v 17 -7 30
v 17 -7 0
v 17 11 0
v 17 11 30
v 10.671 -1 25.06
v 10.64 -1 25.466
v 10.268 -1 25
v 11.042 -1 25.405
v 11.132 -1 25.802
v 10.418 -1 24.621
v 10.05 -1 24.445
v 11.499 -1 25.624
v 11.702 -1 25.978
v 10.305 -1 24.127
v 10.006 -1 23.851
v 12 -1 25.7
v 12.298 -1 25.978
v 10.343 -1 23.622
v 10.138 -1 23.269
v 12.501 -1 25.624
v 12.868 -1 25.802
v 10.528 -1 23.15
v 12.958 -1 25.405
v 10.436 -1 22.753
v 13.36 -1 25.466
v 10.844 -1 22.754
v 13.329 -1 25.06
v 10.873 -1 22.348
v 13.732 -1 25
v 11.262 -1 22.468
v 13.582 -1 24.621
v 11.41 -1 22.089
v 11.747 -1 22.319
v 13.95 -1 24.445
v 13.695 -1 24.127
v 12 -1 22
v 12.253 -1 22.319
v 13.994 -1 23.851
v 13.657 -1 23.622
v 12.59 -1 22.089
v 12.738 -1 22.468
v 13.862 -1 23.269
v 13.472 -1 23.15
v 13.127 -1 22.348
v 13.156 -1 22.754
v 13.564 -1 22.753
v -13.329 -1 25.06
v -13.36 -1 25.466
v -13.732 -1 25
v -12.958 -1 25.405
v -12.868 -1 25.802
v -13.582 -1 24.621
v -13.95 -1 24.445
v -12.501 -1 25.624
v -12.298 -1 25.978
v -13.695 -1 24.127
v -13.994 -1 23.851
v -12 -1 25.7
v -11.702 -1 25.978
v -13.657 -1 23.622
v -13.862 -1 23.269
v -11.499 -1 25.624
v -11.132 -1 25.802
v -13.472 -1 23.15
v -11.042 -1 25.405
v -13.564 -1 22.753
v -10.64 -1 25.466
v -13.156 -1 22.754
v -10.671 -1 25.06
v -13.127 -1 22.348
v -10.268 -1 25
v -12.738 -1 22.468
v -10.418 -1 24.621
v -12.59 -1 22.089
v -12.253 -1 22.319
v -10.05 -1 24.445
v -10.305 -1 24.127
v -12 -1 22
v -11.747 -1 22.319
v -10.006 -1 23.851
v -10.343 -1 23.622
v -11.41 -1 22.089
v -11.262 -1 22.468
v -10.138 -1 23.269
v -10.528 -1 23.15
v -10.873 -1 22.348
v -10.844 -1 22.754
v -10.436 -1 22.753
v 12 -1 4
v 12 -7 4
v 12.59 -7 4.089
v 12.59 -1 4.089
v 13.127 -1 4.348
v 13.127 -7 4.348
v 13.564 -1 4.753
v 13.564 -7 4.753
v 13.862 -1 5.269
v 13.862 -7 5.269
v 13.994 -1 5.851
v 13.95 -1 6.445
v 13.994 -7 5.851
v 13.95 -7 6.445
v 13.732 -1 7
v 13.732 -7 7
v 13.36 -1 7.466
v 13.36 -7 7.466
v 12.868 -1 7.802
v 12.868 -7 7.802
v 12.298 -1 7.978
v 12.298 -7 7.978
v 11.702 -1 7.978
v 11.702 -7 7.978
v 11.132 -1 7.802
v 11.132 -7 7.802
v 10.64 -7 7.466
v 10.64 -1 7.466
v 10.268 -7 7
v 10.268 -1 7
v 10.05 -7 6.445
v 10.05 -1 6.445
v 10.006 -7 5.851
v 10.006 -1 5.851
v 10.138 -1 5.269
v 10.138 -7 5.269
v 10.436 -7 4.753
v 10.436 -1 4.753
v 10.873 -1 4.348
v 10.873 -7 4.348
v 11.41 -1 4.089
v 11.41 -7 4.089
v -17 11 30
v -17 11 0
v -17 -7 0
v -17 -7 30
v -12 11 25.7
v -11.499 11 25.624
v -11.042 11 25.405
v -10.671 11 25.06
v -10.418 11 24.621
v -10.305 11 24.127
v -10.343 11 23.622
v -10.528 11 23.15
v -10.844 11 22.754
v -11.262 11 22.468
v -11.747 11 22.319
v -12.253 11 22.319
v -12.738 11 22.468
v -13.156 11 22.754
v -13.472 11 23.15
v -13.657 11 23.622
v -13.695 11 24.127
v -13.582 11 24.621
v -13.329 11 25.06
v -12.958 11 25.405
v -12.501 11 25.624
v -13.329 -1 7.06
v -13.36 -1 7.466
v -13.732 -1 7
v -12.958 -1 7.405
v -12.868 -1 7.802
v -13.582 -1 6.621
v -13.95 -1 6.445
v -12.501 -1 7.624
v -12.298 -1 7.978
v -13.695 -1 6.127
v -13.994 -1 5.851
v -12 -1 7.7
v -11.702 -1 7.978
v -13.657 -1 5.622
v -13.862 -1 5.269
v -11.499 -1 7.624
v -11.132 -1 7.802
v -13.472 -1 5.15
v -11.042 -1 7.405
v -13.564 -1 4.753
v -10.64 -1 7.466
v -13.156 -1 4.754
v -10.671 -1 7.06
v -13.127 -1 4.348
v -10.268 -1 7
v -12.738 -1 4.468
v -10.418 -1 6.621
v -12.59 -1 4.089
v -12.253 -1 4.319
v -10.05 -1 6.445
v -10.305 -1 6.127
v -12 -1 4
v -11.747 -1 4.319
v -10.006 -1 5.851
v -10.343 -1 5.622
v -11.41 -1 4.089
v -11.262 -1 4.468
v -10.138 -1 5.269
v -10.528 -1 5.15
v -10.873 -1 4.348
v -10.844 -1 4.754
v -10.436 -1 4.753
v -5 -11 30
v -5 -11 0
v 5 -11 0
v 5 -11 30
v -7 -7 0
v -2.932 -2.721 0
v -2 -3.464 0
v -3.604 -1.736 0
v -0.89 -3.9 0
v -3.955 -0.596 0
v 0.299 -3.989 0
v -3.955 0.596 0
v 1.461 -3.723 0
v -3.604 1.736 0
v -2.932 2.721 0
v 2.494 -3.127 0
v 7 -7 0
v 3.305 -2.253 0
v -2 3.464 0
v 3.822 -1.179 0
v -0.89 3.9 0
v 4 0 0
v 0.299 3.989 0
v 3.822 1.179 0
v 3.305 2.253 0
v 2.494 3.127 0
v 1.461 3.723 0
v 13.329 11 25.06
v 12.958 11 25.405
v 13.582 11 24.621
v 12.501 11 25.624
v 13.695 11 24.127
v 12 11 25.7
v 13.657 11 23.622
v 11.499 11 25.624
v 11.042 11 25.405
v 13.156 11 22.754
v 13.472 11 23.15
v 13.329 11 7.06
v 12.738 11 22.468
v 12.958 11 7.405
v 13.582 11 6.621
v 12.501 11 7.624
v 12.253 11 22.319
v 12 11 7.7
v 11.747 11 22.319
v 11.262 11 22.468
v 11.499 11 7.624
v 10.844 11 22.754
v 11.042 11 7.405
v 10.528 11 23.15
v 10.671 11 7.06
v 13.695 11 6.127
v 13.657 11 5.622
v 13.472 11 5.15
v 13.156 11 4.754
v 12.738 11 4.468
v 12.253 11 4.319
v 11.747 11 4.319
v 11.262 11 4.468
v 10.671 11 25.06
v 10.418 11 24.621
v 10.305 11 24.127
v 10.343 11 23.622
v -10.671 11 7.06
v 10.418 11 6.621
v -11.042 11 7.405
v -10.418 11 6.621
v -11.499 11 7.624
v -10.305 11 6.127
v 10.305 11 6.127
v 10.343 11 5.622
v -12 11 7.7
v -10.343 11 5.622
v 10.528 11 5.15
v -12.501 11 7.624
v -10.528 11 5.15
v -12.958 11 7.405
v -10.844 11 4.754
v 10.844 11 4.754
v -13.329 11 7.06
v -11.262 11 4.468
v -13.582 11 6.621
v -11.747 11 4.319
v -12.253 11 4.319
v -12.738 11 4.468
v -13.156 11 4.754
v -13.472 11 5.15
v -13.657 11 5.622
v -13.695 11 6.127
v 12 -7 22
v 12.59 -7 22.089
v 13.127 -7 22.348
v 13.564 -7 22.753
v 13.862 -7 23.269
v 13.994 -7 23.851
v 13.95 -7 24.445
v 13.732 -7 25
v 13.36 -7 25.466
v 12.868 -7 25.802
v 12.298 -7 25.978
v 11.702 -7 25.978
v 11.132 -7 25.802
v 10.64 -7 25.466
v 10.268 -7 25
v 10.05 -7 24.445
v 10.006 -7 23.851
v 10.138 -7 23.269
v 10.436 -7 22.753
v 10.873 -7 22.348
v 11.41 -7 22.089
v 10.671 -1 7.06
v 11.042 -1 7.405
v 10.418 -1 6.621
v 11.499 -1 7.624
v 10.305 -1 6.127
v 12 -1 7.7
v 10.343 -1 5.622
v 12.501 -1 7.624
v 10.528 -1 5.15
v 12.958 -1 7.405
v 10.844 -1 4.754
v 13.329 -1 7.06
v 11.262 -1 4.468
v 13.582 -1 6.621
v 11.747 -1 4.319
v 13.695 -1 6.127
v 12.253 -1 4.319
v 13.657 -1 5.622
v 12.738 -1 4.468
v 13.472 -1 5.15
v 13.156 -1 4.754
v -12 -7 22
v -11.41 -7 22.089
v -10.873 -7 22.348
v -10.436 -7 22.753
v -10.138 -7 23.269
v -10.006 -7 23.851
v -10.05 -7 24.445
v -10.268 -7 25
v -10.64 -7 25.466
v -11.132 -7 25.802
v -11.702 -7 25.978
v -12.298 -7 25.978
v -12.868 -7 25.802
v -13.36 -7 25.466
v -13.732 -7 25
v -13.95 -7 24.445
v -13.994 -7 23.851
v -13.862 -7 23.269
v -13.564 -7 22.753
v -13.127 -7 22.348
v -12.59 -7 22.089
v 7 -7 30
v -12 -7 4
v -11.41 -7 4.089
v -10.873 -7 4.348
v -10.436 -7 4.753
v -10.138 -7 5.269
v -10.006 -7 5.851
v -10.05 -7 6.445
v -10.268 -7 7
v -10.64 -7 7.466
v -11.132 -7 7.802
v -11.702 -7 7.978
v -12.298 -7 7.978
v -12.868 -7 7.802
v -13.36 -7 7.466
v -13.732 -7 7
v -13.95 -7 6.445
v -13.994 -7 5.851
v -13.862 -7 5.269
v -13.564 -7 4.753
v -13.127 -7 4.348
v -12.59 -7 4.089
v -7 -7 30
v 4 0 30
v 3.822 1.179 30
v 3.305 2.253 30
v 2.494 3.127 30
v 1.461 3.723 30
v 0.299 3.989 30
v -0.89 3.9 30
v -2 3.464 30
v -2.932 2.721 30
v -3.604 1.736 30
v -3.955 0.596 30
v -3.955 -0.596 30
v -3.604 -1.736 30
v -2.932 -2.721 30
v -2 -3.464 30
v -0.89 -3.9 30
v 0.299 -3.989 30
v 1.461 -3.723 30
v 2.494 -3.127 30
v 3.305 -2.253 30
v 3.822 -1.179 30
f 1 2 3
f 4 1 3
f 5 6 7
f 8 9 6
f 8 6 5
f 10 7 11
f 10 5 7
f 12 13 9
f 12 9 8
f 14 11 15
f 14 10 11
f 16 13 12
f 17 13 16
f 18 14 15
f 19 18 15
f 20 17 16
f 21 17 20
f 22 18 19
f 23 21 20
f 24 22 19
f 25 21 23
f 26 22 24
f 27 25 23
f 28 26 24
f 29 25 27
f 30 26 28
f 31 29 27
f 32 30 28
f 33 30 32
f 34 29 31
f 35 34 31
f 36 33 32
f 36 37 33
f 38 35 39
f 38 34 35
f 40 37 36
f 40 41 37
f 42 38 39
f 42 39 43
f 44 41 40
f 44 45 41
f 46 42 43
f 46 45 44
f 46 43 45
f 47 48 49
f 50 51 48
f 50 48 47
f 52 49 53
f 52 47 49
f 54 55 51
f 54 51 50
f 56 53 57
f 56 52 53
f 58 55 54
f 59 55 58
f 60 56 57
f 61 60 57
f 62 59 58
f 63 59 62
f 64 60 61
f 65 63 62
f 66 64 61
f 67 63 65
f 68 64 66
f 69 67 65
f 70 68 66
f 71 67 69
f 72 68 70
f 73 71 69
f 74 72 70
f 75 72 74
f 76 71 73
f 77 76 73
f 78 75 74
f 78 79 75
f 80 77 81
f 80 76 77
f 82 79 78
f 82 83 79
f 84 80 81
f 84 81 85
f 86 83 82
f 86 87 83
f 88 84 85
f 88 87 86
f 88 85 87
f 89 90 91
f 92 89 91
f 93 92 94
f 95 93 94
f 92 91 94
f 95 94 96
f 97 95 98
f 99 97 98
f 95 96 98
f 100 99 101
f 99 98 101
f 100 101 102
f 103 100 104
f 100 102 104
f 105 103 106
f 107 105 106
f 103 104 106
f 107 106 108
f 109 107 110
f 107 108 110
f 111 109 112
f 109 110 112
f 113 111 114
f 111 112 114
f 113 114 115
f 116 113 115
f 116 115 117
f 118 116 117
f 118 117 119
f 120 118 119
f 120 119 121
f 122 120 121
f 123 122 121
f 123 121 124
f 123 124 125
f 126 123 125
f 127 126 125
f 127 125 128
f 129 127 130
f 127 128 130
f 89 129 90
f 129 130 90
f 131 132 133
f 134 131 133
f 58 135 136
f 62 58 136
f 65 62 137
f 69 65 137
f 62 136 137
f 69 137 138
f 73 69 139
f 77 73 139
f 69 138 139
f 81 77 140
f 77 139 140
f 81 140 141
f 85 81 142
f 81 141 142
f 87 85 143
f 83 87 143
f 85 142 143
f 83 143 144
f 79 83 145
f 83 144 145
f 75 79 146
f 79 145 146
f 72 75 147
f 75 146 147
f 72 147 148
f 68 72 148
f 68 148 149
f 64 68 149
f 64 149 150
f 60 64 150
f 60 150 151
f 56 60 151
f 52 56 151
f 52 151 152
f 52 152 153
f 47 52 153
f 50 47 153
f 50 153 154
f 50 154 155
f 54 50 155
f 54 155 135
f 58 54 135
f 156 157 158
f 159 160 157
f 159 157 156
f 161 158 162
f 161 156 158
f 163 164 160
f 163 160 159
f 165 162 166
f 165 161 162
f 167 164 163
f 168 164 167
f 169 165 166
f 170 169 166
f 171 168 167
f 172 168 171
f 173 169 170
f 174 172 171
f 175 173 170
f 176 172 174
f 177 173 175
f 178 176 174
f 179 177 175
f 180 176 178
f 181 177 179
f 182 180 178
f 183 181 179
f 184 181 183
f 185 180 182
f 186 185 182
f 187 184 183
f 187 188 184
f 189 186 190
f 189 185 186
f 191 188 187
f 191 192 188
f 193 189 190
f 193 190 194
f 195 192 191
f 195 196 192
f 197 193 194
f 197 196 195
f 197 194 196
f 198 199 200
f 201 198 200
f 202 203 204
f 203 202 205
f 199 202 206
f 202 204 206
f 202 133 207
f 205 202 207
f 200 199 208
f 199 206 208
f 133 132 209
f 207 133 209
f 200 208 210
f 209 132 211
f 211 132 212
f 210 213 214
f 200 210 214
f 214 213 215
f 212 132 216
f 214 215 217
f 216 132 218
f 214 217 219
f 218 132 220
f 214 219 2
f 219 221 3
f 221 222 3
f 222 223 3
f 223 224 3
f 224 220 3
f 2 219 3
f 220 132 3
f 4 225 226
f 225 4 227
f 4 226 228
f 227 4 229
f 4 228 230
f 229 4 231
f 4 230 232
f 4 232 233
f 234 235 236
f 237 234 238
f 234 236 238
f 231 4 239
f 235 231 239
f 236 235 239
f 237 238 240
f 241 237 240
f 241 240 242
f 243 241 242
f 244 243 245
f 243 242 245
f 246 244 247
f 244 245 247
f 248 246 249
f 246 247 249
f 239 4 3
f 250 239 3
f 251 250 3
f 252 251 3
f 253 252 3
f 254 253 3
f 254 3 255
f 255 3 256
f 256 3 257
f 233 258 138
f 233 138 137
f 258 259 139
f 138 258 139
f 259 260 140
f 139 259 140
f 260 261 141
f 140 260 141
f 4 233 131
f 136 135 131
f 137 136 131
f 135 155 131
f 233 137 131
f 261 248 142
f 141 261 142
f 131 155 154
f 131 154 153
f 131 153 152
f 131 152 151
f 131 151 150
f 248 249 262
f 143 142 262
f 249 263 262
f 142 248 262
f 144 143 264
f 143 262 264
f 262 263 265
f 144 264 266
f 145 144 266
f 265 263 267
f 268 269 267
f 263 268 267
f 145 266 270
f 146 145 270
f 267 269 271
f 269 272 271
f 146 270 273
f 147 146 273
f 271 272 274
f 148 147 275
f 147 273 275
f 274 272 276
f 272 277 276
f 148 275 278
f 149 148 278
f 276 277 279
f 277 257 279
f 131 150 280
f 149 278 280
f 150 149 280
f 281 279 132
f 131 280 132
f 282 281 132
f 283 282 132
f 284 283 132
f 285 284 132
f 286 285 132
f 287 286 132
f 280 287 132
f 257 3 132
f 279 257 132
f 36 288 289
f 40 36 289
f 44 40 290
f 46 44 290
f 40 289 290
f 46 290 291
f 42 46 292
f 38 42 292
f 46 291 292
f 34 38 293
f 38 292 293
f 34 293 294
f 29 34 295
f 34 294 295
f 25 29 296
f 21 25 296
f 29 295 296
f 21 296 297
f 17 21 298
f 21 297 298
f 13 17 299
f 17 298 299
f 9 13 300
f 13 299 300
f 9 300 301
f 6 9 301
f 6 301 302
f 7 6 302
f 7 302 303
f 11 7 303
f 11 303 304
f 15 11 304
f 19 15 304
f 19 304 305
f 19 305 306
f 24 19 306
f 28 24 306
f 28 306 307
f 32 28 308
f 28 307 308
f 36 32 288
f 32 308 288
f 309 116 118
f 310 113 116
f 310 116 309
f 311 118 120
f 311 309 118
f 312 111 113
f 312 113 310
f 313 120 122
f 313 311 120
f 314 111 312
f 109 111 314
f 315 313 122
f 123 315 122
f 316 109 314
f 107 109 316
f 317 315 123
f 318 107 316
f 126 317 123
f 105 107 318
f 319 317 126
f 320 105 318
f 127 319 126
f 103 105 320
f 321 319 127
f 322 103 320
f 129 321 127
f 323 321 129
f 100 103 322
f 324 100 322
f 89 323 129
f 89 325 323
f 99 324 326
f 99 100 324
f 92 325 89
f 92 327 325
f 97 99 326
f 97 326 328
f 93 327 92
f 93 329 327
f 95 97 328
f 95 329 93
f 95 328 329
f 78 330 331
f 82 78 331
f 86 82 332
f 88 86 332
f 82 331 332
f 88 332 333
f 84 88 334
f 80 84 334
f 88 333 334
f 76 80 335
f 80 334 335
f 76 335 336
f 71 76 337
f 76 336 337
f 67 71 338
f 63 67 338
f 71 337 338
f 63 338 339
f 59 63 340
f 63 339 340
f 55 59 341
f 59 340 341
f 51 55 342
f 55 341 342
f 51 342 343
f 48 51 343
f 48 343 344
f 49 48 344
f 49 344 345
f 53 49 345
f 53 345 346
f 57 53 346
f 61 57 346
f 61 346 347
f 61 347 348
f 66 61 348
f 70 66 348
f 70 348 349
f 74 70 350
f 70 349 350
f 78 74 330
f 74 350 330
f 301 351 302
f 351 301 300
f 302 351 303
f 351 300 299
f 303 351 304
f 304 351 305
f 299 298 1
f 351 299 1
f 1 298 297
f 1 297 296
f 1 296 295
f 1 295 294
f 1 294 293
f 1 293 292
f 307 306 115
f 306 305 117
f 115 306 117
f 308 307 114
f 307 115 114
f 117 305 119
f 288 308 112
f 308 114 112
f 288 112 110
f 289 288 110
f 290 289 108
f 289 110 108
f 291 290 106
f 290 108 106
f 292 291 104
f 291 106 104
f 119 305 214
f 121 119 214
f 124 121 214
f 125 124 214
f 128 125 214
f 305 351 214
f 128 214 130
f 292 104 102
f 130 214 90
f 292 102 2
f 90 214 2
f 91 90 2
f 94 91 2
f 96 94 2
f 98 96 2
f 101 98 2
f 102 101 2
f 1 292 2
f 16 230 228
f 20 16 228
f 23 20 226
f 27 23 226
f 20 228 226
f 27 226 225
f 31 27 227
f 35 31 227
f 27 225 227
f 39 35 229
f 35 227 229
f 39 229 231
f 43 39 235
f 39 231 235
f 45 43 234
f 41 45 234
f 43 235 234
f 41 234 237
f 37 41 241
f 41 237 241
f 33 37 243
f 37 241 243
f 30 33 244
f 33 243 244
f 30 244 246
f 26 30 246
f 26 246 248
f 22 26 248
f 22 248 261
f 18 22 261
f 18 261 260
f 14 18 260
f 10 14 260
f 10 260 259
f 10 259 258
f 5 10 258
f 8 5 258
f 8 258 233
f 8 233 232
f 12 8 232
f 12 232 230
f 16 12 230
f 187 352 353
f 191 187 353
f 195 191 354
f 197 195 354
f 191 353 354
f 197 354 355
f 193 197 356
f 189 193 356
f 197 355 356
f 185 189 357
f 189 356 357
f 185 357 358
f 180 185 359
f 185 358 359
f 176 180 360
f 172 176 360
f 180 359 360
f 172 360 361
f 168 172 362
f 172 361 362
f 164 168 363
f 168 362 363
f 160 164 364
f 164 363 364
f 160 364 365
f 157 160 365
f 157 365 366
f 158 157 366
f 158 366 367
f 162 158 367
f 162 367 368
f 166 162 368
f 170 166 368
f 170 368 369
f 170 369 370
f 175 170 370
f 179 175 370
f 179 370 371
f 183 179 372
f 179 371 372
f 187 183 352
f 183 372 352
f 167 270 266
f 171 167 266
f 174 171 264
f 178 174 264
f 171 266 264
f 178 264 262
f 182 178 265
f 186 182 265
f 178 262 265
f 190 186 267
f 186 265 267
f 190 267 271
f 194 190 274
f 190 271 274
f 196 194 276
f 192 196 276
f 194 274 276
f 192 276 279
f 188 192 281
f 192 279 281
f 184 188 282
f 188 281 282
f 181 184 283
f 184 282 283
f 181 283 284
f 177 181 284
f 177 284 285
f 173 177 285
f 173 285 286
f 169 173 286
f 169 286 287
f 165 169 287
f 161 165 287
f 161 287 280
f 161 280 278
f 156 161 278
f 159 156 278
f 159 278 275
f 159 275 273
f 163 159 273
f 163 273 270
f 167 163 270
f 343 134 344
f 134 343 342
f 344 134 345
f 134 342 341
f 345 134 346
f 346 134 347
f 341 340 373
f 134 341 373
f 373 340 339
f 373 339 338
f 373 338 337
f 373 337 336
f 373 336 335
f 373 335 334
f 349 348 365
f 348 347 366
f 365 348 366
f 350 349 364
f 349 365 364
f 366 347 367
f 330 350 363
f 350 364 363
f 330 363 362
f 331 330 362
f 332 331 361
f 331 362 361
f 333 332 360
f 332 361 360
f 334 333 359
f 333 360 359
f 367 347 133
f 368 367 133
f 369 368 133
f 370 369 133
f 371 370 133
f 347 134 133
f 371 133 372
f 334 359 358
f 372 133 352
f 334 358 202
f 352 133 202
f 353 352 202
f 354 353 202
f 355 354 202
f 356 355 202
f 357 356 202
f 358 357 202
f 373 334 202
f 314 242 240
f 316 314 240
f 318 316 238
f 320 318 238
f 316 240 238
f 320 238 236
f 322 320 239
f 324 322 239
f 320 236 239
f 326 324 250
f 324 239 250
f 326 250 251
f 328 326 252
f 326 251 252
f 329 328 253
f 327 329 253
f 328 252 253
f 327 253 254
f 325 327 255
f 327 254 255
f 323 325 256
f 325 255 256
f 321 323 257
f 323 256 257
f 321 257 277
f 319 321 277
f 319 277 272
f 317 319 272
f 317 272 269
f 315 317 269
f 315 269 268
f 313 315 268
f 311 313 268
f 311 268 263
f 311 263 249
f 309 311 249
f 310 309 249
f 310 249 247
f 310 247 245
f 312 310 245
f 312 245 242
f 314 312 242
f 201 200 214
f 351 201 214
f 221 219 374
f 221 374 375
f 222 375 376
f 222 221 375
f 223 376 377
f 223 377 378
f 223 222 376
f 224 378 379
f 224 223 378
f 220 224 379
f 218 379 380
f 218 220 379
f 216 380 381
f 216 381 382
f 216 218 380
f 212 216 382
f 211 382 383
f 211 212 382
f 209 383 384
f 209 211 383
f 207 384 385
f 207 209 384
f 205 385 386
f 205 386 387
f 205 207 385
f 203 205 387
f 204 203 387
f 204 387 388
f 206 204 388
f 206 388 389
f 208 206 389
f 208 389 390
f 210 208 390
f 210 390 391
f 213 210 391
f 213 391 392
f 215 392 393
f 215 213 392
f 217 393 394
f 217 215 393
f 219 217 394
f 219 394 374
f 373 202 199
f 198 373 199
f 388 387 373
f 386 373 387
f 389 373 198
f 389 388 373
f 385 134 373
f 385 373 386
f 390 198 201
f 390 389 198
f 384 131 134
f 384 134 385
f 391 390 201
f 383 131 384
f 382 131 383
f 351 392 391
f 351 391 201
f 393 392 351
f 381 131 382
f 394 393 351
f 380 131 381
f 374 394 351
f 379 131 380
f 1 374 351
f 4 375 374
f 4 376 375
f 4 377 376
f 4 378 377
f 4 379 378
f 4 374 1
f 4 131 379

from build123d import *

# Parameters (mm, degrees)
SKETCH_1_R          = 4
EXTRUDE_1_DEPTH     = 30
SKETCH_3_R          = 1.7
CUT_EXTRUDE_1_DEPTH = 30
SKETCH_4_R          = 2
CUT_EXTRUDE_2_DEPTH = 6


with BuildPart() as part:
    # 草图1 → 凸台-拉伸1 (new body)
    with BuildSketch(Plane.XY):
        Polygon((-17, -7), (-7, -7), (-5, -11), (5, -11), (7, -7), (17, -7), (17, 11), (-17, 11), align=None)
        Circle(SKETCH_1_R, mode=Mode.SUBTRACT)
    extrude(amount=EXTRUDE_1_DEPTH)

    # 草图3 → 切除-拉伸1 (cut)
    with BuildSketch(Plane(origin=(0, 11, 0), x_dir=(1, 0, 0), z_dir=(0, 1, 0))):
        with Locations(Location((12, -6, 0), (0, 0, 270))):
            Circle(SKETCH_3_R)
        with Locations(Location((-12, -6, 0), (0, 0, 270))):
            Circle(SKETCH_3_R)
        with Locations(Location((-12, -24, 0), (0, 0, 270))):
            Circle(SKETCH_3_R)
        with Locations(Location((12, -24, 0), (0, 0, 270))):
            Circle(SKETCH_3_R)
    extrude(amount=-CUT_EXTRUDE_1_DEPTH, mode=Mode.SUBTRACT)

    # 草图4 → 切除-拉伸2 (cut)
    with BuildSketch(Plane.XZ.offset(7)):
        with Locations(Location((-12, 24, 0), (0, 0, 270))):
            Circle(SKETCH_4_R)
        with Locations(Location((12, 24, 0), (0, 0, 270))):
            Circle(SKETCH_4_R)
        with Locations(Location((12, 6, 0), (0, 0, 270))):
            Circle(SKETCH_4_R)
        with Locations(Location((-12, 6, 0), (0, 0, 270))):
            Circle(SKETCH_4_R)
    extrude(amount=-CUT_EXTRUDE_2_DEPTH, mode=Mode.SUBTRACT)


solid = part.part
